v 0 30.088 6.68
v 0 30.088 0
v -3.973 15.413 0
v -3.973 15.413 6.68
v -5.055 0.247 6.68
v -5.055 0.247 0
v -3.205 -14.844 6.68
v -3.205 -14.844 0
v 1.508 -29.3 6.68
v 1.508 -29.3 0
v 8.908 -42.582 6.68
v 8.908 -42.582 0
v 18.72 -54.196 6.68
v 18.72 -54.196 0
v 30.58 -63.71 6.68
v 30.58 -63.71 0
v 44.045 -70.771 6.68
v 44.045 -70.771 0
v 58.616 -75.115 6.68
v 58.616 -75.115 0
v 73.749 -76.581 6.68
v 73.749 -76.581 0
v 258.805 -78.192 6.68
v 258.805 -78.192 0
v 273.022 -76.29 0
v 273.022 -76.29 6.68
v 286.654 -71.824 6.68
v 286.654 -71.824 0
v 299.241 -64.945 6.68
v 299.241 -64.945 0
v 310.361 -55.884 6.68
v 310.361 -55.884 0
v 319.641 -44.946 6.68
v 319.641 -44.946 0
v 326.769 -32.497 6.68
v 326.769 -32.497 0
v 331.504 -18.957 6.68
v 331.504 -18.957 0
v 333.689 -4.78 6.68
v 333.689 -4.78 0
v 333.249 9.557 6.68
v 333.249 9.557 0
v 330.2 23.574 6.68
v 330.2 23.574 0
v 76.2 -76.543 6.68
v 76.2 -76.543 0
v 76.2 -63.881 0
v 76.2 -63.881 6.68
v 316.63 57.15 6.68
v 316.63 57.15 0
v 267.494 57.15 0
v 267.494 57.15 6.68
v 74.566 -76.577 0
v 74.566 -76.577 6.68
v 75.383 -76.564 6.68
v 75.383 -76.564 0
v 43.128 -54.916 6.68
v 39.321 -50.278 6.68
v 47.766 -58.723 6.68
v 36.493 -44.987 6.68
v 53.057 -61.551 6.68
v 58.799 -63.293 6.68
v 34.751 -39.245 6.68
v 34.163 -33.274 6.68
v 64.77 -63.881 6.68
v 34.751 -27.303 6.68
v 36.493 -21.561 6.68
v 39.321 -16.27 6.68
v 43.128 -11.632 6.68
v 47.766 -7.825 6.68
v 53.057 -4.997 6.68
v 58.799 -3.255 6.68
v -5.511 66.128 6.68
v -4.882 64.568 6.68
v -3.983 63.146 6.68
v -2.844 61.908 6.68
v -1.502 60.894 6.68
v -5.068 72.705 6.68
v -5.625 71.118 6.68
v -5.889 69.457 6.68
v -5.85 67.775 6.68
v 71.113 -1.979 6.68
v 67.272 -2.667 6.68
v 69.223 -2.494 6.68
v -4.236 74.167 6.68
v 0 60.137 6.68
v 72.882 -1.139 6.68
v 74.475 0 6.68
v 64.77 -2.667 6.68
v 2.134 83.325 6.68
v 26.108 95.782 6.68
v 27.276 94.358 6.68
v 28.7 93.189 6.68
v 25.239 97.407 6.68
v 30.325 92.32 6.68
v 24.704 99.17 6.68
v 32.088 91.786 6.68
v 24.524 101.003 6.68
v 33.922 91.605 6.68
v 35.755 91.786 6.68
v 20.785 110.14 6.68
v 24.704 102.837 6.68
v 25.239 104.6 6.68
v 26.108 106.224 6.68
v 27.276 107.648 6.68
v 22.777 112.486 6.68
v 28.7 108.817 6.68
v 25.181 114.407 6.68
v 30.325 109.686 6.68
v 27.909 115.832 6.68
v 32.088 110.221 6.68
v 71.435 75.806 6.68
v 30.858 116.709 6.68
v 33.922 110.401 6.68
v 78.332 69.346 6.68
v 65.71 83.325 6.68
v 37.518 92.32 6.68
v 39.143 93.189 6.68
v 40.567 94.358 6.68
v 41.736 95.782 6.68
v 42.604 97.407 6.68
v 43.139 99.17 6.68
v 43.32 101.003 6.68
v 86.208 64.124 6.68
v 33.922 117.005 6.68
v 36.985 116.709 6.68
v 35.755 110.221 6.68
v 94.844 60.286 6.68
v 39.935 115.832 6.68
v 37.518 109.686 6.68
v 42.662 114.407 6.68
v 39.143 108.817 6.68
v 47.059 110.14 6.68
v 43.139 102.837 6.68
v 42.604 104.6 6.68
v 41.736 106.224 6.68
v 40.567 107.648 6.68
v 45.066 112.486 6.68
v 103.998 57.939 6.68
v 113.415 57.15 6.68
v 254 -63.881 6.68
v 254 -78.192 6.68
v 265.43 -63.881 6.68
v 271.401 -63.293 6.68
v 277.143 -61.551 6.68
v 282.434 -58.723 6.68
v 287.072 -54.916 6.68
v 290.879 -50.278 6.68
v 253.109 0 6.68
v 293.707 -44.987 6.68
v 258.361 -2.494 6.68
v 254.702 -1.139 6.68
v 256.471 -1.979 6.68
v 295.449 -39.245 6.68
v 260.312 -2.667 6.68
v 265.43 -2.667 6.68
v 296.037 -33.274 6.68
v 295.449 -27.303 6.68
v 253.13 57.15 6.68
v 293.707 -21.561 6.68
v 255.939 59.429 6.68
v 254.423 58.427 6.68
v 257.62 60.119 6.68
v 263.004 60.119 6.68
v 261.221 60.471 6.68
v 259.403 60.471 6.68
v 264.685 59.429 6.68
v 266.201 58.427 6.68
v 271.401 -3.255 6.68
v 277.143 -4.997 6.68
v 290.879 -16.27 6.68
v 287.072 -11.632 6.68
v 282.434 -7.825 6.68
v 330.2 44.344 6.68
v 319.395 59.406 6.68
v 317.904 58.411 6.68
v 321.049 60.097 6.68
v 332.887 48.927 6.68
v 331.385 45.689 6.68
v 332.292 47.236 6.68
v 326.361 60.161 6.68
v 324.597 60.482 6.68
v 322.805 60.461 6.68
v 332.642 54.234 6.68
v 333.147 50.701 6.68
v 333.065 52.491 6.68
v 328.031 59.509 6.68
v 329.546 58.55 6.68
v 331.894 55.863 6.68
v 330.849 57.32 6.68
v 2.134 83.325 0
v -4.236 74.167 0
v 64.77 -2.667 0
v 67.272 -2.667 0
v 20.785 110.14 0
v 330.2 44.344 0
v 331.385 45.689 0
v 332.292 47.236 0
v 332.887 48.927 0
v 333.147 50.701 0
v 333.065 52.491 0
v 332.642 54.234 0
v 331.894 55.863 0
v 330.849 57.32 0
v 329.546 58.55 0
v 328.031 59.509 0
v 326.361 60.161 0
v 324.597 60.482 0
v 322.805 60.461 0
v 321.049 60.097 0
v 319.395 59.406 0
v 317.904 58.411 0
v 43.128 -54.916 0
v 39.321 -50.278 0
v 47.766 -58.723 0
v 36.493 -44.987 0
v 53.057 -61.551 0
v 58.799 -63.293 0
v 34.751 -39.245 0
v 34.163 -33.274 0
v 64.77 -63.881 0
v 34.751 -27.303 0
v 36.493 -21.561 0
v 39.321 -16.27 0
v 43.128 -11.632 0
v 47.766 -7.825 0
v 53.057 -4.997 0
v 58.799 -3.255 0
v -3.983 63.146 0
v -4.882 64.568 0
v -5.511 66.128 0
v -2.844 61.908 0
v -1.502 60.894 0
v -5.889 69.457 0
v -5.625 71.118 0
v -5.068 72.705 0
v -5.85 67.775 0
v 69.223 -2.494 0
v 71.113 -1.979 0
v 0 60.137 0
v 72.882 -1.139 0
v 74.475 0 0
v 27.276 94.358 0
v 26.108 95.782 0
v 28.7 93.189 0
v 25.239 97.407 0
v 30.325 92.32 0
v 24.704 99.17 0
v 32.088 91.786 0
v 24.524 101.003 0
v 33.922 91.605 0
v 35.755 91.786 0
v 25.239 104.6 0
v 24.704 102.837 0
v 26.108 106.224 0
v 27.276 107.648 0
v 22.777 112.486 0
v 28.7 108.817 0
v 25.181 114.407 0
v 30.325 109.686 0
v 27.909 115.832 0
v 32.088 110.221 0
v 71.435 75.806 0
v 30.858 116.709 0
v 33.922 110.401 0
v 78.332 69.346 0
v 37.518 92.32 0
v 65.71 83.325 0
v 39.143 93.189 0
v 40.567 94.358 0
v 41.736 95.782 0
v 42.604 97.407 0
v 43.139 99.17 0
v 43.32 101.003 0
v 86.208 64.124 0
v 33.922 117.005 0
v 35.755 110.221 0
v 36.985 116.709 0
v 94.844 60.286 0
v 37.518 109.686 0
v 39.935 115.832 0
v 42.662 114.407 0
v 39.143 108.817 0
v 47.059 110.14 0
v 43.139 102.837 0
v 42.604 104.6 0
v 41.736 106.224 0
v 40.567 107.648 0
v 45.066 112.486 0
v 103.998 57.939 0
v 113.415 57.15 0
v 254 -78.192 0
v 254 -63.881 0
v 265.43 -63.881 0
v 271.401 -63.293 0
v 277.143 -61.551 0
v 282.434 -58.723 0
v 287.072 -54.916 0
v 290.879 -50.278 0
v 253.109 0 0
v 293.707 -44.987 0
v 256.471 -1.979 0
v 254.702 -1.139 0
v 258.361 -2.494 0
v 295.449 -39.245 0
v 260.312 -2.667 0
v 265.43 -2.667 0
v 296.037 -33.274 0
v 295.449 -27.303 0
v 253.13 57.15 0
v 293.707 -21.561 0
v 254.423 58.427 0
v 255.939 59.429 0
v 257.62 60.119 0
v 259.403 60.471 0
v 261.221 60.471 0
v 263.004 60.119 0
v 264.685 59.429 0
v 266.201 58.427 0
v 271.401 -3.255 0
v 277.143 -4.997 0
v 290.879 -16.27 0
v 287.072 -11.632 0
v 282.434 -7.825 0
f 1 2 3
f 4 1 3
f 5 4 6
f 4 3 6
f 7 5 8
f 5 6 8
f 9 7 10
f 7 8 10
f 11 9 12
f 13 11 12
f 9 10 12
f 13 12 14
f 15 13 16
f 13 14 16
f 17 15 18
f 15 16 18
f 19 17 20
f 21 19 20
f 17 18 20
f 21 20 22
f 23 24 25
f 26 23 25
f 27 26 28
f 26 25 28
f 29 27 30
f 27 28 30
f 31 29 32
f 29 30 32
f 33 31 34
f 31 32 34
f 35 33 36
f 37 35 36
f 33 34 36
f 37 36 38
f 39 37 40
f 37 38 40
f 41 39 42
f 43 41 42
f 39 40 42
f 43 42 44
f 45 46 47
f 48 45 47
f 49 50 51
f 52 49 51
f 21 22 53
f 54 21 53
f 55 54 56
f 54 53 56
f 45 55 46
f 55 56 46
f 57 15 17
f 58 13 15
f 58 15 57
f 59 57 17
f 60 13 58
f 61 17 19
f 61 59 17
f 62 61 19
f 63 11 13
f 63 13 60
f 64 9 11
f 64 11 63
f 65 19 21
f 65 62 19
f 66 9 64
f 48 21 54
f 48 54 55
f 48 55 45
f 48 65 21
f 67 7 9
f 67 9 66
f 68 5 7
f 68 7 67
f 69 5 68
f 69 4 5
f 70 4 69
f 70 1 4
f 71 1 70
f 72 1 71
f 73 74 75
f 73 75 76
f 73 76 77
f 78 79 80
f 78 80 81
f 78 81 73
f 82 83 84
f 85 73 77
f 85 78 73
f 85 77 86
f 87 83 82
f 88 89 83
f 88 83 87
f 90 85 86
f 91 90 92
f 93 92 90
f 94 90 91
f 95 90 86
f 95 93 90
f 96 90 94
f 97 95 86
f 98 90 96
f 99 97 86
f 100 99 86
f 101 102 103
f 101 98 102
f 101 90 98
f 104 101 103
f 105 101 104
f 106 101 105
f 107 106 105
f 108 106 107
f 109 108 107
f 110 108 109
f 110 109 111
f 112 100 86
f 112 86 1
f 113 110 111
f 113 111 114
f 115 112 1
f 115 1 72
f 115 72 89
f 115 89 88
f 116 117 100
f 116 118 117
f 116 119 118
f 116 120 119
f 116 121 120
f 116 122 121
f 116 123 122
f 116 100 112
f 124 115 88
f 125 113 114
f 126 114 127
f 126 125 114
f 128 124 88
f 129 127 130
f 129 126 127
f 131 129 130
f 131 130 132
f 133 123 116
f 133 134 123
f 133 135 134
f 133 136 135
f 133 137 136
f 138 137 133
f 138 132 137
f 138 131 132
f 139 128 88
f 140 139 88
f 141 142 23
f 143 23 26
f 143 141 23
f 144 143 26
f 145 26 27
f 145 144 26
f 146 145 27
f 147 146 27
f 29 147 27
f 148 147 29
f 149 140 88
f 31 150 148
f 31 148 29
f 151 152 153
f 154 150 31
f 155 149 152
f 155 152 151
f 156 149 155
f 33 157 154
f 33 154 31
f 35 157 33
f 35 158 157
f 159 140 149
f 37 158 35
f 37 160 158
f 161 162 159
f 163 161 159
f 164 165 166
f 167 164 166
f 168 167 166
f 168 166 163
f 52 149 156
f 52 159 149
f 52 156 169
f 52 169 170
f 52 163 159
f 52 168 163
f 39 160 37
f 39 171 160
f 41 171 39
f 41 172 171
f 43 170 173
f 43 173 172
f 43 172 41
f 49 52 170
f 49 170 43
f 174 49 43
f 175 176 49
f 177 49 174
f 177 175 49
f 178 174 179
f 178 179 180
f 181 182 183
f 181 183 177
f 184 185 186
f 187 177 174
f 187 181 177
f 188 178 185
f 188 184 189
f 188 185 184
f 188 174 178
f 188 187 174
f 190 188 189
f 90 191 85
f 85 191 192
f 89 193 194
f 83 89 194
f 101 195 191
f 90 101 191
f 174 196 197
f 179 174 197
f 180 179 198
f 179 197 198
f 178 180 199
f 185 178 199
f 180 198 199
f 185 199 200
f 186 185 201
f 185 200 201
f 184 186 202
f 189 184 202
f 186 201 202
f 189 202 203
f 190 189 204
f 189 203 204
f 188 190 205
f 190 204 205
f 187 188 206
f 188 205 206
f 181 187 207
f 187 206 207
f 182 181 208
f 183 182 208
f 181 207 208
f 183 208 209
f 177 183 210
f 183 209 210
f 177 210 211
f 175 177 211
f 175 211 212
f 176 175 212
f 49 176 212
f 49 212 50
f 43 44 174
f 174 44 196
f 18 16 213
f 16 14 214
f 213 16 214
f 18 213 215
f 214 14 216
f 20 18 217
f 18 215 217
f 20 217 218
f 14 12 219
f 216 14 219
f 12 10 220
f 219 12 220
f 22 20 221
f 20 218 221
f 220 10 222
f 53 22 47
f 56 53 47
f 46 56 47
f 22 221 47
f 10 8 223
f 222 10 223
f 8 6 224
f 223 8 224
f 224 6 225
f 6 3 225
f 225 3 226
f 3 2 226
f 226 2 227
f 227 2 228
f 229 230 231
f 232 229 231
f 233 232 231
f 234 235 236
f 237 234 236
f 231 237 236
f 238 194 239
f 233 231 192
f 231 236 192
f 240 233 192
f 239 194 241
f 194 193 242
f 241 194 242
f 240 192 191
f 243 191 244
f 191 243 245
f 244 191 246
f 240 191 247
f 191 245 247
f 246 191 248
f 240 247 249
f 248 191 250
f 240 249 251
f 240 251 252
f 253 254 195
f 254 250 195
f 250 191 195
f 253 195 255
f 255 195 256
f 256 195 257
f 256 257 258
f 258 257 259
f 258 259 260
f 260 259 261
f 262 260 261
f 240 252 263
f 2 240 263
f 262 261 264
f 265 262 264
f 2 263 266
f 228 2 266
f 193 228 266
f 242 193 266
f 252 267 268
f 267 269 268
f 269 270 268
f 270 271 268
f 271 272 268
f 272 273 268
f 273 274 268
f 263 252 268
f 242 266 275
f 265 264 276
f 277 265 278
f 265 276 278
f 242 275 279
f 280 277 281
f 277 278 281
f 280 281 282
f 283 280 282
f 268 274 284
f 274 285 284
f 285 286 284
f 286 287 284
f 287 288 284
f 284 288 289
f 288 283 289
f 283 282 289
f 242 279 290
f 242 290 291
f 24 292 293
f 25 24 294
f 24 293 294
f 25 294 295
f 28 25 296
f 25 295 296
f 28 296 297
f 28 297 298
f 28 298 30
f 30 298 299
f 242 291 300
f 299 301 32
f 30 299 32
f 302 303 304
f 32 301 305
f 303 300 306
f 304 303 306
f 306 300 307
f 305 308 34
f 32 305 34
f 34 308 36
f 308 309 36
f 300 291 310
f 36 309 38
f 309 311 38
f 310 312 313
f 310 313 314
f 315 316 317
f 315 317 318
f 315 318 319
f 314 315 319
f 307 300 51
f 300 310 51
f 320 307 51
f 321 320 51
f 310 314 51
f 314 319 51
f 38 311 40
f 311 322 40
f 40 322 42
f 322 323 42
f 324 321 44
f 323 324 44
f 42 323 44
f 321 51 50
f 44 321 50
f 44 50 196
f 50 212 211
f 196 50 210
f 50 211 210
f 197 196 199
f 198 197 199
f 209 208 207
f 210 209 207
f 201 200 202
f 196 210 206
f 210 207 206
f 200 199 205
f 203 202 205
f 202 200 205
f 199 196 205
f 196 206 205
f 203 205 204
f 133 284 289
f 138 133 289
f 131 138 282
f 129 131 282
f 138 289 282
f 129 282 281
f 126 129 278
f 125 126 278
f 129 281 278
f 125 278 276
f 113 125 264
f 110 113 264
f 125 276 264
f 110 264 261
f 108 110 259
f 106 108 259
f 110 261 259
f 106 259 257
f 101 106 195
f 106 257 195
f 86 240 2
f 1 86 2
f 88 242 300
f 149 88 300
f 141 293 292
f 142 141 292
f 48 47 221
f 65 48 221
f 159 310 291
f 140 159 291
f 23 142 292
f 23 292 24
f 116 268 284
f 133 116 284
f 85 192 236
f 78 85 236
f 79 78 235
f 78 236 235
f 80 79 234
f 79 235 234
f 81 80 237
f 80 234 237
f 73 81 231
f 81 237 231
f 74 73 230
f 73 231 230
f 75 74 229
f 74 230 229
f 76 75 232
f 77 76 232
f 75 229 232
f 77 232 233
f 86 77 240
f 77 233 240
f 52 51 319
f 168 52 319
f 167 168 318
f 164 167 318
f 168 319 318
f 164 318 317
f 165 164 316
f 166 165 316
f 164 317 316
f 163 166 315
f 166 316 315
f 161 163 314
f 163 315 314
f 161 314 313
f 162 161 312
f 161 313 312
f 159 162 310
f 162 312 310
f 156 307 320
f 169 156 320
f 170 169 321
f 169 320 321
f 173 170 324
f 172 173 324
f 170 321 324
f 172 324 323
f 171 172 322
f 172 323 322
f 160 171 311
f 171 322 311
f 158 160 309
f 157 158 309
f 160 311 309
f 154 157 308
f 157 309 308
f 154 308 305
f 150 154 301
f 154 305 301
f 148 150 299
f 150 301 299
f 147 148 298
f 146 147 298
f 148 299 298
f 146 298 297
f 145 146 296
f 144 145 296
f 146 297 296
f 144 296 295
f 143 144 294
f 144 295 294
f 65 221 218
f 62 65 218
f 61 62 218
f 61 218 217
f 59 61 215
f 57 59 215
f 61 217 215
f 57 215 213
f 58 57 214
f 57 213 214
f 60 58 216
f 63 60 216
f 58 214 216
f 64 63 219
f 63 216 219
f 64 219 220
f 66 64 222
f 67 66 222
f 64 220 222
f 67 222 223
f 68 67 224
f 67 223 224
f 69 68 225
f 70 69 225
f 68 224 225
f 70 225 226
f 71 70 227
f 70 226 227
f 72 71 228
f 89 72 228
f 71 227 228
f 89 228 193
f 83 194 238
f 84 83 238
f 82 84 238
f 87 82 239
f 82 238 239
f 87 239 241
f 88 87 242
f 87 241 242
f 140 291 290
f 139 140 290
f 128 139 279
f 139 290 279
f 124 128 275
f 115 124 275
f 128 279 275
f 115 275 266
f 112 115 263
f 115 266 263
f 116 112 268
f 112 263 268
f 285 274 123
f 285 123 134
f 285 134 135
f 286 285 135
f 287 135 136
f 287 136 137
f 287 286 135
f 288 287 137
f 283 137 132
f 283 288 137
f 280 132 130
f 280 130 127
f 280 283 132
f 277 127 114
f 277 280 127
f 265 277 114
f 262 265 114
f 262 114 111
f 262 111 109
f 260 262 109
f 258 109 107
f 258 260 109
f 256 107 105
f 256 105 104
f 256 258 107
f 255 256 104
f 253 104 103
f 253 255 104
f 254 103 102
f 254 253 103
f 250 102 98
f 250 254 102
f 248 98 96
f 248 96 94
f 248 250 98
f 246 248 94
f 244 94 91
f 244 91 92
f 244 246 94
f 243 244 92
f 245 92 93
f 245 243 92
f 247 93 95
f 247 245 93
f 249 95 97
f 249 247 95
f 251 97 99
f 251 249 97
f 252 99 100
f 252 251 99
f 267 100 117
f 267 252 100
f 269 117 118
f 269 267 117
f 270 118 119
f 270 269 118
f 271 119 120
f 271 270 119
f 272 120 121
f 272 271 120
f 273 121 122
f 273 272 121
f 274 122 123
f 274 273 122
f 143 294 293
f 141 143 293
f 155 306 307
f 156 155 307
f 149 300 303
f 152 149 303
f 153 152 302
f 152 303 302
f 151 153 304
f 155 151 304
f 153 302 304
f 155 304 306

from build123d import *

# Parameters (mm, degrees)
SKETCH1_R           = 9.398
BOSS_EXTRUDE1_DEPTH = 6.6802


with BuildPart() as part:
    # Sketch1 → Boss-Extrude1 (new body)
    with BuildSketch(Plane.XY):
        with BuildLine():
            ThreePointArc((67.2719, -2.667), (71.112502584, -1.978843865), (74.475234217, 0))
            Line((74.475234217, 0), (253.108565783, 0))
            ThreePointArc((253.108565783, 0), (256.471297416, -1.978843865), (260.3119, -2.667))
            Line((260.3119, -2.667), (265.43, -2.667))
            ThreePointArc((265.43, -2.667), (296.037, -33.274), (265.43, -63.881))
            Line((265.43, -63.881), (254, -63.881))
            Line((254, -63.881), (254, -78.192462102))
            Line((254, -78.192462102), (258.804744722, -78.192462102))
            ThreePointArc((258.804744722, -78.192462102), (319.641243362, -44.945714973), (330.2, 23.573905719))
            Line((330.2, 23.573905719), (330.2, 44.344229198))
            ThreePointArc((330.2, 44.344229198), (330.227085405, 57.966090028), (316.629665681, 57.15))
            Line((316.629665681, 57.15), (267.494134319, 57.15))
            ThreePointArc((267.494134319, 57.15), (260.3119, 60.515088497), (253.129665681, 57.15))
            Line((253.129665681, 57.15), (113.415260688, 57.15))
            ThreePointArc((113.415260688, 57.15), (86.208048701, 64.123551226), (65.709724775, 83.324632368))
            Line((65.709724775, 83.324632368), (47.058503367, 110.140244689))
            ThreePointArc((47.058503367, 110.140244689), (33.921662387, 117.0051), (20.784821408, 110.140244689))
            Line((20.784821408, 110.140244689), (2.1336, 83.324632368))
            Line((2.1336, 83.324632368), (-4.235992095, 74.166813235))
            ThreePointArc((-4.235992095, 74.166813235), (-5.510617618, 66.127763534), (0, 60.137431006))
            Line((0, 60.137431006), (0, 30.088432035))
            ThreePointArc((0, 30.088432035), (8.908195227, -42.581537647), (73.7489, -76.581))
            ThreePointArc((73.7489, -76.581), (74.974598175, -76.57147033), (76.2, -76.542883623))
            Line((76.2, -76.542883623), (76.2, -63.881))
            Line((76.2, -63.881), (64.77, -63.881))
            ThreePointArc((64.77, -63.881), (34.163, -33.274), (64.77, -2.667))
            Line((64.77, -2.667), (67.2719, -2.667))
        make_face()
        with Locations((33.921662387, 101.0031)):
            Circle(SKETCH1_R, mode=Mode.SUBTRACT)
    extrude(amount=BOSS_EXTRUDE1_DEPTH)


solid = part.part
